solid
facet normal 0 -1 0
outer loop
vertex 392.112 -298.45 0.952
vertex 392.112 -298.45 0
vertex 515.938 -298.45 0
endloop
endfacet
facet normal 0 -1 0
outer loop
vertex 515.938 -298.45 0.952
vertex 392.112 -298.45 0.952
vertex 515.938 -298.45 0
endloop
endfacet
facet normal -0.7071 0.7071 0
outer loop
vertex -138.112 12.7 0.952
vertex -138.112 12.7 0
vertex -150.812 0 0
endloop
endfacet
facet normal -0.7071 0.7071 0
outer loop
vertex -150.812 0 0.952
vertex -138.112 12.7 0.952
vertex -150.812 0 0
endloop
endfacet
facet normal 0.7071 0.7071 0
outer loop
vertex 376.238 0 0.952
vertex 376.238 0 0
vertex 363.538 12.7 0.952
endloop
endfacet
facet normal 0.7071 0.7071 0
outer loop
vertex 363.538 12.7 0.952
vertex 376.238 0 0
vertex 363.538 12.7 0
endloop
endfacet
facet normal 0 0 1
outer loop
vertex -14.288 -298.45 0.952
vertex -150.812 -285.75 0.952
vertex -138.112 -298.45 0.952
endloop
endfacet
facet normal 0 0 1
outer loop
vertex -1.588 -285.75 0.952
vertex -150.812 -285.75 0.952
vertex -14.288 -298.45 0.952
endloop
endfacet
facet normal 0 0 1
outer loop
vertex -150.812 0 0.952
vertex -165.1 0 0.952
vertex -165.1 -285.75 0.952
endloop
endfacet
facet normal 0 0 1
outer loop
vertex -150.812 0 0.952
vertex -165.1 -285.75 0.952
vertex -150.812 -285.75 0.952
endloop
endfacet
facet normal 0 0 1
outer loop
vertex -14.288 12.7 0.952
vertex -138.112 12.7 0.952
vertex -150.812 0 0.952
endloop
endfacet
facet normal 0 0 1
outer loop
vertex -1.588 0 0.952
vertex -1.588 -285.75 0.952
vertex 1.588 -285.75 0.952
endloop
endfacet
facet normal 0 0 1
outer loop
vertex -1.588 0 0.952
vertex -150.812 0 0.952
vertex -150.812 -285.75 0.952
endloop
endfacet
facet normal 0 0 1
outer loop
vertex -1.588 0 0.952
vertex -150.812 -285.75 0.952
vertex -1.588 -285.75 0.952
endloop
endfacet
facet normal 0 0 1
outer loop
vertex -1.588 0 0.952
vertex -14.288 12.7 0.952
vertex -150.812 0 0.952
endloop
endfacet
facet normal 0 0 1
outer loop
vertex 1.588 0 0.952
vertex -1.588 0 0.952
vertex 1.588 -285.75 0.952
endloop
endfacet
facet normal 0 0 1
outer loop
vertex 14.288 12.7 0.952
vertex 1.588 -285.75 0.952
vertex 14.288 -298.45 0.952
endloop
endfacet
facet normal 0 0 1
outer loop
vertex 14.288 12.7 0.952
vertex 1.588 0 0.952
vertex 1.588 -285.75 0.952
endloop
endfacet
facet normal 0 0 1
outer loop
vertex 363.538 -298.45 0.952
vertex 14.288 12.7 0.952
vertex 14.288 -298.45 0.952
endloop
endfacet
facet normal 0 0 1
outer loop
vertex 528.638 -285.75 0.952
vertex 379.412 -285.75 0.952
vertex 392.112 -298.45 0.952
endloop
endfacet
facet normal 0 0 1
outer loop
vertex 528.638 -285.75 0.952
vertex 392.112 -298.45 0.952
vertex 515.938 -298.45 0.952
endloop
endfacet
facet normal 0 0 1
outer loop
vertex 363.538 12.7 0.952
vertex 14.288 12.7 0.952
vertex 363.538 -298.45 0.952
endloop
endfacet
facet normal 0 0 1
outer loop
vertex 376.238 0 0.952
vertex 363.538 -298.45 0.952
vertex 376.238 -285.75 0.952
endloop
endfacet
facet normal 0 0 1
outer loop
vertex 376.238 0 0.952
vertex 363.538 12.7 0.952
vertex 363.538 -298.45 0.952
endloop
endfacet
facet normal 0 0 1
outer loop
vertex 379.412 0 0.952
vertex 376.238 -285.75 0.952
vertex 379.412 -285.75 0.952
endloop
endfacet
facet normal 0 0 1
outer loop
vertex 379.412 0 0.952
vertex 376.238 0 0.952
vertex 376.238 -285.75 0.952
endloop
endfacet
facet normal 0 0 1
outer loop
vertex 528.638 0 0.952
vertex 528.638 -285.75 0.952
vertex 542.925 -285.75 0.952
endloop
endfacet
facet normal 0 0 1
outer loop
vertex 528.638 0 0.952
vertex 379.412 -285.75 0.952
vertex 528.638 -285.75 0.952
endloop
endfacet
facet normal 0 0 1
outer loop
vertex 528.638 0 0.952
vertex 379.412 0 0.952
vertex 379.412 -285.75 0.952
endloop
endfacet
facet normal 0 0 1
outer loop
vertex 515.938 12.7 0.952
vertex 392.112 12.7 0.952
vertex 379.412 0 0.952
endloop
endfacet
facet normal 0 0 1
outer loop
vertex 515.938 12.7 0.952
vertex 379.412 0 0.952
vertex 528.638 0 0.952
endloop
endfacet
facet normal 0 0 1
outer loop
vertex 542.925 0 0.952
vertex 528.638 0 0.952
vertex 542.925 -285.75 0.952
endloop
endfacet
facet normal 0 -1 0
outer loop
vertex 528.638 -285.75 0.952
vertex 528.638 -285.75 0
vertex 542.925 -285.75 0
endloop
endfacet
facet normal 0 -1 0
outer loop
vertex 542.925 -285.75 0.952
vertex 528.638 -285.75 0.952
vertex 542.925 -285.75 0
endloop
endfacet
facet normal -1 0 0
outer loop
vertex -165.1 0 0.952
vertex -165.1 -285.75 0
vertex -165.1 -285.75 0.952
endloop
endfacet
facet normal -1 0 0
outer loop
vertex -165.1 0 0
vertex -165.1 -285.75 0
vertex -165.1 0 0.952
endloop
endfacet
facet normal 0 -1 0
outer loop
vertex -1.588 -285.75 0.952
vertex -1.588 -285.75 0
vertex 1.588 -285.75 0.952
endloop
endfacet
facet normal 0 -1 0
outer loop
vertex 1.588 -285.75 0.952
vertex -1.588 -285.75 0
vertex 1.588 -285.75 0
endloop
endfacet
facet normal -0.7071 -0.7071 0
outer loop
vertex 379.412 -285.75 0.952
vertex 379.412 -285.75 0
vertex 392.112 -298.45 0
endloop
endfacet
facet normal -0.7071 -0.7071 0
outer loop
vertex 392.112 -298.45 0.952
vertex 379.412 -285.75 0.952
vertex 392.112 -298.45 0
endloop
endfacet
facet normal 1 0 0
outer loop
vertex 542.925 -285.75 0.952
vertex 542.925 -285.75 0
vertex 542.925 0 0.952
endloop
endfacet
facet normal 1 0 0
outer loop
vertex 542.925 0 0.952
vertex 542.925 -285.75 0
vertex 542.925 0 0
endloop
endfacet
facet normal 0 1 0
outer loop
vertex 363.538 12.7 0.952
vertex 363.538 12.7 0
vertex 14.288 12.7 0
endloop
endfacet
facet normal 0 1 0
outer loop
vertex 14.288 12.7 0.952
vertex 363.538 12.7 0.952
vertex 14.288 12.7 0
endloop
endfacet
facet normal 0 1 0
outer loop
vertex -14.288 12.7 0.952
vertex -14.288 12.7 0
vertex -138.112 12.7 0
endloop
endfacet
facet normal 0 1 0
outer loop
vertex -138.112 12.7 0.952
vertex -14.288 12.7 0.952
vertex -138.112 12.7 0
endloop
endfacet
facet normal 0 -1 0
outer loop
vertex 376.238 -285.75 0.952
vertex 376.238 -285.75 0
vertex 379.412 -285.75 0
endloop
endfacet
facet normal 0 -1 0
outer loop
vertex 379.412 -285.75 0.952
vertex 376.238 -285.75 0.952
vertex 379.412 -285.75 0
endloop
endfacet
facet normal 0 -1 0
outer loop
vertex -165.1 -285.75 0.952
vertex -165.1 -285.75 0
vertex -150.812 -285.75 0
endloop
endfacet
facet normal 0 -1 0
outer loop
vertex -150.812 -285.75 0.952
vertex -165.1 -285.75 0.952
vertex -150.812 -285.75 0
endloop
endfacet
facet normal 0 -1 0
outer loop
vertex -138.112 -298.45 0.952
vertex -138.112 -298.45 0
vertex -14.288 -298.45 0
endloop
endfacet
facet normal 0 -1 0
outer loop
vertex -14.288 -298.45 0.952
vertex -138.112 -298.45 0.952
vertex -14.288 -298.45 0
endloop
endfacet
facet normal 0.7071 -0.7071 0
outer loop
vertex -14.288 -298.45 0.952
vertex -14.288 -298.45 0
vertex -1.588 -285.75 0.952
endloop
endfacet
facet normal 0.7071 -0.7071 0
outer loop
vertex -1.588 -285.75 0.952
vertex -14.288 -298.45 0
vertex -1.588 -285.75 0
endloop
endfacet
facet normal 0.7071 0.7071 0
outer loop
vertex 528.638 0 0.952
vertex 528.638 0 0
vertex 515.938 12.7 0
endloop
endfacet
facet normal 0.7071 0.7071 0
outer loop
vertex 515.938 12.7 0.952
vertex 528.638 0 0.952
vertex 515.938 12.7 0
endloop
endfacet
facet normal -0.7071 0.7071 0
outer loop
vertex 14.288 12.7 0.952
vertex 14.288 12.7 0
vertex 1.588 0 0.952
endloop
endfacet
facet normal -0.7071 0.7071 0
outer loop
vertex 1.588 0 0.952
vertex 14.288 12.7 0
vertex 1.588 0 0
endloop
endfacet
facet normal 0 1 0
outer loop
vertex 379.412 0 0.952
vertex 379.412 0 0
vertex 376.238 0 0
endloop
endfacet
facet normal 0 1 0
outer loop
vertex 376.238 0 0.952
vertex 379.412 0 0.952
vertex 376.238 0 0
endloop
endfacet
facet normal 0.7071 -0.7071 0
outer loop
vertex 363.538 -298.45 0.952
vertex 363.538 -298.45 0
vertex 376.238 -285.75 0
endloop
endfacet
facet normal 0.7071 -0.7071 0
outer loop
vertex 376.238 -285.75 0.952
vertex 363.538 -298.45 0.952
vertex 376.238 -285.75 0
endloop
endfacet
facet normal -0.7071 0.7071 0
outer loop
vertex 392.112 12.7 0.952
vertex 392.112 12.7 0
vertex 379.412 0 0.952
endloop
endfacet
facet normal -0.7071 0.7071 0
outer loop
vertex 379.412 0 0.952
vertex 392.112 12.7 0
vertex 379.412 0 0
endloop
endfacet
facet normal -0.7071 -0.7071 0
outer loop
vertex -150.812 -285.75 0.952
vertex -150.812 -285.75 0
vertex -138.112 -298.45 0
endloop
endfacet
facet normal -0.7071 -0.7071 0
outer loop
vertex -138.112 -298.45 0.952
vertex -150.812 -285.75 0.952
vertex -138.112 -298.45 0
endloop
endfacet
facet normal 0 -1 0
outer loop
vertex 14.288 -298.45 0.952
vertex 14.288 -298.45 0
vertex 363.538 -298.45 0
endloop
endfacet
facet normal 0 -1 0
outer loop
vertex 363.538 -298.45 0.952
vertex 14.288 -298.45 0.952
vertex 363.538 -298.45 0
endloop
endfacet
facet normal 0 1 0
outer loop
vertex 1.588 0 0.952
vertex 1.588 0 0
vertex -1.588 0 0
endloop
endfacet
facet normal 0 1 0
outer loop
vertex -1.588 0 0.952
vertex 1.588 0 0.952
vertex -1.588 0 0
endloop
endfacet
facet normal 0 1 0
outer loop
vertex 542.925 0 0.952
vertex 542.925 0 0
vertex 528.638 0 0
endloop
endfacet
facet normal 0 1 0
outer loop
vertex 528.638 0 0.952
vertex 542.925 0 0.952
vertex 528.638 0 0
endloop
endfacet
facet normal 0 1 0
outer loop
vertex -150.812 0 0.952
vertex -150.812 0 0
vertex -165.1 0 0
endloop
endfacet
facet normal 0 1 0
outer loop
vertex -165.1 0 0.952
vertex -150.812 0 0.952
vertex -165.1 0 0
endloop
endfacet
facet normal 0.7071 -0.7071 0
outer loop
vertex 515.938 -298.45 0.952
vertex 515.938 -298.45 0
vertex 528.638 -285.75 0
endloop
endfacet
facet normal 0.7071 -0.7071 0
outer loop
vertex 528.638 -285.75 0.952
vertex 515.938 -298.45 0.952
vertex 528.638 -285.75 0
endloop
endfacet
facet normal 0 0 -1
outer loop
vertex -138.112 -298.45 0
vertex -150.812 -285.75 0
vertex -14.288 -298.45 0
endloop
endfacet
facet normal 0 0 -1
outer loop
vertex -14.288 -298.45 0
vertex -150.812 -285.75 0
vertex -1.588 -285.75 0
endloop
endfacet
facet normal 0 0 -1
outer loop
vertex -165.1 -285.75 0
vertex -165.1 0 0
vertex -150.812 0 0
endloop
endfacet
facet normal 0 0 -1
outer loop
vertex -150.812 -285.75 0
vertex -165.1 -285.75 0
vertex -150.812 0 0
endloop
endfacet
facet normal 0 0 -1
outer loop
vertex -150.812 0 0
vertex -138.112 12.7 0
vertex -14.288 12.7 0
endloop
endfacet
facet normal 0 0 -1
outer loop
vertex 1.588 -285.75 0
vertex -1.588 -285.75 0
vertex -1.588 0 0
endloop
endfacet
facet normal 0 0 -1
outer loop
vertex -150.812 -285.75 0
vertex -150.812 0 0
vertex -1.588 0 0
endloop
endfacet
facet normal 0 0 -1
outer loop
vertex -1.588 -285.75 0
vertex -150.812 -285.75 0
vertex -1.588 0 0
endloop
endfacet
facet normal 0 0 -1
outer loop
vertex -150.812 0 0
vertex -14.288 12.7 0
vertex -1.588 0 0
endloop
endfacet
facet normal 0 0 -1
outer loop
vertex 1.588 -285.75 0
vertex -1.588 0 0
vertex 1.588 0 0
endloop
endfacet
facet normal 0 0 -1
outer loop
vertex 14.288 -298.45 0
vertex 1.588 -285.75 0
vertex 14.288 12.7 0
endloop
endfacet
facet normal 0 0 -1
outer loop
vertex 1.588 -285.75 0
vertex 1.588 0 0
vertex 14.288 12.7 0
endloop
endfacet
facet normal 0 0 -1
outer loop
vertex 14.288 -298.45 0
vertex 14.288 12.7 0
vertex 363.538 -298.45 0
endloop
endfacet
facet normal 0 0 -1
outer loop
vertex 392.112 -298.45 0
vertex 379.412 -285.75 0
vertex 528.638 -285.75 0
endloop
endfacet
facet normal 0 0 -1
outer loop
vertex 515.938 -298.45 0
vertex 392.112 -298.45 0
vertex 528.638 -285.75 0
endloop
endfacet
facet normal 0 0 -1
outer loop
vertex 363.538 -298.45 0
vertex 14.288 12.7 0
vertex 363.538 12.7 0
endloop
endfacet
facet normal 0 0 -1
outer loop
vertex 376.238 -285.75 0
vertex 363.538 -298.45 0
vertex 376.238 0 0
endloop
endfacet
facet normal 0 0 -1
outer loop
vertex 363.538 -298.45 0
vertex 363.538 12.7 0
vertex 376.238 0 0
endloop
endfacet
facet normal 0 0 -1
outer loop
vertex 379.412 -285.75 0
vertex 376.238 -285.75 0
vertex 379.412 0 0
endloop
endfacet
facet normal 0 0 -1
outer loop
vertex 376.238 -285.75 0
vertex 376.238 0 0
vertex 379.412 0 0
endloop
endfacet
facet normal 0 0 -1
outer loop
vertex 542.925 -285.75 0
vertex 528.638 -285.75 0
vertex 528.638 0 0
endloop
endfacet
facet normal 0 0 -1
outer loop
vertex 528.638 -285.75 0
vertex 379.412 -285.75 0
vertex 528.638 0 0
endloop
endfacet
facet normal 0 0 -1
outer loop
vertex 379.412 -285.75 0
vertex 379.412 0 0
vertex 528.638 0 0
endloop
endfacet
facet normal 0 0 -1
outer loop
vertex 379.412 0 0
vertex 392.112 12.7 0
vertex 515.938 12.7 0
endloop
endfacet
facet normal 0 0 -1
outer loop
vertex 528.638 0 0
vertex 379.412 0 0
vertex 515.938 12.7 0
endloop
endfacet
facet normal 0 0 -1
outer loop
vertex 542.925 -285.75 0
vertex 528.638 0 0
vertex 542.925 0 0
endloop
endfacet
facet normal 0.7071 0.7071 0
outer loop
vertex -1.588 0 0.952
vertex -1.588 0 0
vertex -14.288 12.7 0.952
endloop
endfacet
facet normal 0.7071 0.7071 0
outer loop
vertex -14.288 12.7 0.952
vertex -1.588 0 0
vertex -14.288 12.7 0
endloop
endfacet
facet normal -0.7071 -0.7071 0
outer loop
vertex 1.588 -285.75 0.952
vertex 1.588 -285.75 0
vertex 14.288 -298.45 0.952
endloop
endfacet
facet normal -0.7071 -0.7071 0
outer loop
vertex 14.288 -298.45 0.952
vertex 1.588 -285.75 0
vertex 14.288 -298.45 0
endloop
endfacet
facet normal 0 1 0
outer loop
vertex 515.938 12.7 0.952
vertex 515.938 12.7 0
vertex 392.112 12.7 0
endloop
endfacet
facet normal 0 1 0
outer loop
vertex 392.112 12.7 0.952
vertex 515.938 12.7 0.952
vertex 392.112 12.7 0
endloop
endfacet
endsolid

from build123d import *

# Parameters (mm, degrees)
F0_W     = 12.7
F0_H     = 285.75
F1_DEPTH = 0.9525


with BuildPart() as f1:
    # F0 (on Top) → F1 (new body)
    with BuildSketch(Plane.XY):
        Polygon((1.5875, 0), (0, 0), (0, -285.75), (1.5875, -285.75), (188.9125, -285.75), (376.2375, -285.75), (377.825, -285.75), (377.825, 0), (376.2375, 0), (188.9125, 0), align=None)
        Polygon((0, -285.75), (0, 0), (-1.5875, 0), (-150.8125, 0), (-152.4, 0), (-152.4, -285.75), (-150.8125, -285.75), (-1.5875, -285.75), align=None)
        Polygon((14.2875, 12.7), (1.5875, 0), (188.9125, 0), (376.2375, 0), (363.5375, 12.7), (188.9125, 12.7), align=None)
        Polygon((-150.8125, 0), (-1.5875, 0), (-14.2875, 12.7), (-138.1125, 12.7), align=None)
        Polygon((188.9125, -285.75), (1.5875, -285.75), (14.2875, -298.45), (188.9125, -298.45), (363.5375, -298.45), (376.2375, -285.75), align=None)
        Polygon((-14.2875, -298.45), (-1.5875, -285.75), (-150.8125, -285.75), (-138.1125, -298.45), align=None)
        with Locations((-158.75, -142.875)):
            Rectangle(F0_W, F0_H)
        Polygon((379.4125, 0), (377.825, 0), (377.825, -285.75), (379.4125, -285.75), (528.6375, -285.75), (530.225, -285.75), (530.225, 0), (528.6375, 0), align=None)
        Polygon((392.1125, 12.7), (379.4125, 0), (528.6375, 0), (515.9375, 12.7), align=None)
        Polygon((528.6375, -285.75), (379.4125, -285.75), (392.1125, -298.45), (515.9375, -298.45), align=None)
        with Locations((536.575, -142.875)):
            Rectangle(F0_W, F0_H)
    extrude(amount=F1_DEPTH)


solid = f1.part
